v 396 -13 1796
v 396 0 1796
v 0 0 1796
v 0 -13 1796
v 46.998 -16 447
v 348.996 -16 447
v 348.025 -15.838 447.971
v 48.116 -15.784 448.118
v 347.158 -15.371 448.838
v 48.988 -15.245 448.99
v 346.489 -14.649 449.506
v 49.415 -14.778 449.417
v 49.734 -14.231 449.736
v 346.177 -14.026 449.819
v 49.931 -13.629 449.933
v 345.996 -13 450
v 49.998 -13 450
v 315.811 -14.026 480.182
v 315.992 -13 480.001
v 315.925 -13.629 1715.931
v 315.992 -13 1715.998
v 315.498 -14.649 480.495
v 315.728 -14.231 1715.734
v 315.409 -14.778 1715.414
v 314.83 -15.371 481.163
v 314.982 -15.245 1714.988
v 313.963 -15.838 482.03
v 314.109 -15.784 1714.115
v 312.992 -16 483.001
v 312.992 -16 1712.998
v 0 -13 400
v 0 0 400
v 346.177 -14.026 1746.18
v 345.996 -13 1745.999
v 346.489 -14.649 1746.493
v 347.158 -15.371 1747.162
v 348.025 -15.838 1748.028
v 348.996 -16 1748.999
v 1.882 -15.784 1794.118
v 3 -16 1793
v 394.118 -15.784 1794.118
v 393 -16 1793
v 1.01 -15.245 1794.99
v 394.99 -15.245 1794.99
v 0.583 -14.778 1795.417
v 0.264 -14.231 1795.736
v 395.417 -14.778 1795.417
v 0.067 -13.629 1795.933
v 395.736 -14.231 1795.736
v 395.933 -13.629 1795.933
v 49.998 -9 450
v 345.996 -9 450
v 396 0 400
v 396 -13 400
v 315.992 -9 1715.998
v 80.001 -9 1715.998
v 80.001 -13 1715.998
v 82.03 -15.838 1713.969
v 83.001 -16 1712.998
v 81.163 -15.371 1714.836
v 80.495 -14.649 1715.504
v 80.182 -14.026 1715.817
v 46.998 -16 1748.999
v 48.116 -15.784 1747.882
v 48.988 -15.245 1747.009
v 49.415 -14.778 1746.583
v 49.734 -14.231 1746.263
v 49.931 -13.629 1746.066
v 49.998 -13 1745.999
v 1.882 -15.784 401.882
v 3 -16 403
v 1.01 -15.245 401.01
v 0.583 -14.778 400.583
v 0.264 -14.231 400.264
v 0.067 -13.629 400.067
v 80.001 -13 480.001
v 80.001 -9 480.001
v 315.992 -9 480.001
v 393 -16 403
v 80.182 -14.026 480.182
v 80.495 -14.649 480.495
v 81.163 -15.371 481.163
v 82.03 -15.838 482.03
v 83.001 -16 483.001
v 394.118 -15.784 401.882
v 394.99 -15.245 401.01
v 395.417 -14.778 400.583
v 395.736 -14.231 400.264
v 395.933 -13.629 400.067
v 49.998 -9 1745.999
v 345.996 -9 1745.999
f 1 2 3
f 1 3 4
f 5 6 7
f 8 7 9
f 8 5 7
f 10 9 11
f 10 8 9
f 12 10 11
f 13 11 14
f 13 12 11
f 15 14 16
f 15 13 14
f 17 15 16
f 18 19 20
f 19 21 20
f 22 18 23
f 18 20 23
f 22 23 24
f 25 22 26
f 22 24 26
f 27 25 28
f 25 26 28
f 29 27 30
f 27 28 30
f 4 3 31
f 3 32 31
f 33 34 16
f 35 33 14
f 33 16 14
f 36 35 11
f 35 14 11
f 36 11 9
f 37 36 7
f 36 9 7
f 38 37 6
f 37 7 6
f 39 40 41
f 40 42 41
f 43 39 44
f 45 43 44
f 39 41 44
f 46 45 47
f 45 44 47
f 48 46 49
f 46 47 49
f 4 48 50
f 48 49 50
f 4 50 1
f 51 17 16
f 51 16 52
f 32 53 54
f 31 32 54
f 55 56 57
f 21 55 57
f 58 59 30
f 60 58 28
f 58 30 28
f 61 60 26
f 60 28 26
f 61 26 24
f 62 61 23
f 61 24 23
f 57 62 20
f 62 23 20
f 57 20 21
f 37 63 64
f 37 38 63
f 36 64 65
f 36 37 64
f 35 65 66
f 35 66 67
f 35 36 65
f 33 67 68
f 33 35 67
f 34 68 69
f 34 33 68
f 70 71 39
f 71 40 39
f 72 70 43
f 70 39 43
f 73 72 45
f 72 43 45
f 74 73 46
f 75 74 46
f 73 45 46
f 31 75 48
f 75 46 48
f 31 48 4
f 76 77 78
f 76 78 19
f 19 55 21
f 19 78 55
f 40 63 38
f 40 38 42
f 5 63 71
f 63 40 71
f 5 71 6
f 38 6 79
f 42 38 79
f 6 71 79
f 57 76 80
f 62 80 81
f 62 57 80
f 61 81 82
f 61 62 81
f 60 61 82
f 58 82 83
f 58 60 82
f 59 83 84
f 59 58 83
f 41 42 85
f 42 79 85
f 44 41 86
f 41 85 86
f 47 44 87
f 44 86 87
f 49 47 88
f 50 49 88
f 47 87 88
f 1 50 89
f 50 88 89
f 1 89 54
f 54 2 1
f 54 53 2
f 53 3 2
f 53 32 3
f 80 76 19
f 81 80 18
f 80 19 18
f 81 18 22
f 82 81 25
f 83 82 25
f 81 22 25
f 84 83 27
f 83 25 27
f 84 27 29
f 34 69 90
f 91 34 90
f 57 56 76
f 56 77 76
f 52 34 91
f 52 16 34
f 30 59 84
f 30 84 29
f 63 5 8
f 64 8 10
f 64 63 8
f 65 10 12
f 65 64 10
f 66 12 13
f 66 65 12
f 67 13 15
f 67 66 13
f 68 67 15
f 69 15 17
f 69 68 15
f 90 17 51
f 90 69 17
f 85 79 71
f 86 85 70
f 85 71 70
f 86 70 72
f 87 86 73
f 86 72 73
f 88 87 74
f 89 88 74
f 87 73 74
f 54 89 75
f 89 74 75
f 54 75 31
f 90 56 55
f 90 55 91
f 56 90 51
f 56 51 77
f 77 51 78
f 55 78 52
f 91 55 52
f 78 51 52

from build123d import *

# Parameters (mm, degrees)
F0_W      = 44.656470418
F0_H      = 33.8078811765
F1_DEPTH  = 16
F2_DEPTH  = 796
F3_DEPTH  = 196
F4_W      = 68.9578056335
F4_H      = 493.6993122101
F5_DEPTH  = 7
F6_DEPTH  = 9.7
F7_DEPTH  = 99.33
F8_DEPTH  = 99.33
F9_DEPTH  = 17.34
F10_DEPTH = 102.97
F11_W     = 35.2807044983
F11_H     = 492.0964837074
F12_DEPTH = 7
F13_DEPTH = 37.27
F14_DEPTH = 6.58
F15_DEPTH = 106.63
F16_DEPTH = 5.87
F17_DEPTH = 200
F18_DEPTH = 200
F19_DEPTH = 200
F20_DEPTH = 200
F21_DEPTH = 200
F22_DEPTH = 200
F23_DEPTH = 400
F24_DEPTH = 400
F25_DEPTH = 400
F26_DEPTH = 400
F27_DEPTH = 400
F28_DEPTH = 400
F29_DEPTH = 400
F30_DEPTH = 400
F31_DEPTH = 400
F32_DEPTH = 1000
F33_DEPTH = 1000
F34_DEPTH = 1000
F35_DEPTH = 1000
F36_DEPTH = 1000
F37_DEPTH = 1000
F38_R     = 3


with BuildPart() as f1:
    # F0 (on Front) → F1 (new body)
    with BuildSketch(Plane.XZ):
        with Locations((22.328235209, 16.9039405882)):
            Rectangle(F0_W, F0_H)
    extrude(amount=F1_DEPTH)

    # F2 (add): a face of the model
    f2_faces = [f1.faces().sort_by_distance(p)[0] for p in [
        (22.328235209, -8, 0),
    ]]
    extrude(f2_faces, amount=-F2_DEPTH)

    # F3 (add): a face of the model
    f3_faces = [f1.faces().sort_by_distance(p)[0] for p in [
        (0, -8, 398),
    ]]
    extrude(f3_faces, amount=-F3_DEPTH)

    # F4 (on face) → F5 (cut)
    with BuildSketch(Plane.XZ.offset(16)):
        with Locations((94.1769480705, 399.8196721077)):
            Rectangle(F4_W, F4_H)
    extrude(amount=-F5_DEPTH, mode=Mode.SUBTRACT)

    # F6 (cut): a face of the model
    f6_faces = [f1.faces().sort_by_distance(p)[0] for p in [
        (59.6980452538, -12.5, 399.8196721077),
    ]]
    extrude(f6_faces, amount=-F6_DEPTH, mode=Mode.SUBTRACT)

    # F7 (add): a face of the model
    f7_faces = [f1.faces().sort_by_distance(p)[0] for p in [
        (89.3269480705, -12.5, 646.6693282127),
    ]]
    extrude(f7_faces, amount=-F7_DEPTH)

    # F8 (cut): a face of the model
    f8_faces = [f1.faces().sort_by_distance(p)[0] for p in [
        (89.3269480705, -12.5, 646.6693282127),
    ]]
    extrude(f8_faces, amount=-F8_DEPTH, mode=Mode.SUBTRACT)

    # F9 (cut): a face of the model
    f9_faces = [f1.faces().sort_by_distance(p)[0] for p in [
        (128.6558508873, -12.5, 449.4846721077),
    ]]
    extrude(f9_faces, amount=-F9_DEPTH, mode=Mode.SUBTRACT)

    # F10 (cut): a face of the model
    f10_faces = [f1.faces().sort_by_distance(p)[0] for p in [
        (97.9969480705, -12.5, 152.9700160027),
    ]]
    extrude(f10_faces, amount=-F10_DEPTH, mode=Mode.SUBTRACT)

    # F11 (on face) → F12 (join)
    with BuildSketch(Plane.XZ.offset(9)):
        with Locations((91.7714834213, 432.6795041561)):
            Rectangle(F11_W, F11_H)
    extrude(amount=F12_DEPTH)

    # F13 (add): a face of the model
    f13_faces = [f1.faces().sort_by_distance(p)[0] for p in [
        (91.7714834213, -12.5, 678.7277460098),
    ]]
    extrude(f13_faces, amount=F13_DEPTH)

    # F14 (add): a face of the model
    f14_faces = [f1.faces().sort_by_distance(p)[0] for p in [
        (109.4118356705, -12.5, 451.3145041561),
    ]]
    extrude(f14_faces, amount=F14_DEPTH)

    # F15 (add): a face of the model
    f15_faces = [f1.faces().sort_by_distance(p)[0] for p in [
        (95.0614834213, -12.5, 186.6312623024),
    ]]
    extrude(f15_faces, amount=F15_DEPTH)

    # F16 (cut): a face of the model
    f16_faces = [f1.faces().sort_by_distance(p)[0] for p in [
        (74.1311311722, -12.5, 397.9995041561),
    ]]
    extrude(f16_faces, amount=-F16_DEPTH, mode=Mode.SUBTRACT)

    # F17 (add): a face of the model
    f17_faces = [f1.faces().sort_by_distance(p)[0] for p in [
        (196, -8, 398),
    ]]
    extrude(f17_faces, amount=F17_DEPTH)

    # F18 (cut): a face of the model
    f18_faces = [f1.faces().sort_by_distance(p)[0] for p in [
        (145.9958508873, -12.5, 397.9996721077),
    ]]
    extrude(f18_faces, amount=-F18_DEPTH, mode=Mode.SUBTRACT)

    # F19 (add): a face of the model
    f19_faces = [f1.faces().sort_by_distance(p)[0] for p in [
        (115.9918356705, -12.5, 397.9995041561),
    ]]
    extrude(f19_faces, amount=F19_DEPTH)

    # F20 (add): a face of the model
    f20_faces = [f1.faces().sort_by_distance(p)[0] for p in [
        (396, -8, 398),
    ]]
    extrude(f20_faces, amount=F20_DEPTH)

    # F21 (cut): a face of the model
    f21_faces = [f1.faces().sort_by_distance(p)[0] for p in [
        (345.9958508873, -12.5, 397.9996721077),
    ]]
    extrude(f21_faces, amount=-F21_DEPTH, mode=Mode.SUBTRACT)

    # F22 (add): a face of the model
    f22_faces = [f1.faces().sort_by_distance(p)[0] for p in [
        (315.9918356705, -12.5, 397.9995041561),
    ]]
    extrude(f22_faces, amount=F22_DEPTH)

    # F23 (add): a face of the model
    f23_faces = [f1.faces().sort_by_distance(p)[0] for p in [
        (596, -8, 398),
    ]]
    extrude(f23_faces, amount=F23_DEPTH)

    # F24 (cut): a face of the model
    f24_faces = [f1.faces().sort_by_distance(p)[0] for p in [
        (545.9958508873, -12.5, 397.9996721077),
    ]]
    extrude(f24_faces, amount=-F24_DEPTH, mode=Mode.SUBTRACT)

    # F25 (add): a face of the model
    f25_faces = [f1.faces().sort_by_distance(p)[0] for p in [
        (515.9918356705, -12.5, 397.9995041561),
    ]]
    extrude(f25_faces, amount=F25_DEPTH)

    # F26 (cut): a face of the model
    f26_faces = [f1.faces().sort_by_distance(p)[0] for p in [
        (497.9964834213, -12.5, 80.0012623024),
    ]]
    extrude(f26_faces, amount=-F26_DEPTH, mode=Mode.SUBTRACT)

    # F27 (add): a face of the model
    f27_faces = [f1.faces().sort_by_distance(p)[0] for p in [
        (497.9969480705, -12.5, 50.0000160027),
    ]]
    extrude(f27_faces, amount=F27_DEPTH)

    # F28 (cut): a face of the model
    f28_faces = [f1.faces().sort_by_distance(p)[0] for p in [
        (498, -8, 0),
    ]]
    extrude(f28_faces, amount=-F28_DEPTH, mode=Mode.SUBTRACT)

    # F29 (add): a face of the model
    f29_faces = [f1.faces().sort_by_distance(p)[0] for p in [
        (996, -8, 598),
    ]]
    extrude(f29_faces, amount=F29_DEPTH)

    # F30 (cut): a face of the model
    f30_faces = [f1.faces().sort_by_distance(p)[0] for p in [
        (945.9958508873, -12.5, 597.9996721077),
    ]]
    extrude(f30_faces, amount=-F30_DEPTH, mode=Mode.SUBTRACT)

    # F31 (add): a face of the model
    f31_faces = [f1.faces().sort_by_distance(p)[0] for p in [
        (915.9918356705, -12.5, 597.9995041561),
    ]]
    extrude(f31_faces, amount=F31_DEPTH)

    # F32 (cut): a face of the model
    f32_faces = [f1.faces().sort_by_distance(p)[0] for p in [
        (1315.9918356705, -12.5, 597.9995041561),
    ]]
    extrude(f32_faces, amount=-F32_DEPTH, mode=Mode.SUBTRACT)

    # F33 (add): a face of the model
    f33_faces = [f1.faces().sort_by_distance(p)[0] for p in [
        (1345.9958508873, -12.5, 597.9996721077),
    ]]
    extrude(f33_faces, amount=F33_DEPTH)

    # F34 (cut): a face of the model
    f34_faces = [f1.faces().sort_by_distance(p)[0] for p in [
        (1396, -8, 598),
    ]]
    extrude(f34_faces, amount=-F34_DEPTH, mode=Mode.SUBTRACT)

    # F35 (add): a face of the model
    f35_faces = [f1.faces().sort_by_distance(p)[0] for p in [
        (198, -8, 796),
    ]]
    extrude(f35_faces, amount=F35_DEPTH)

    # F36 (cut): a face of the model
    f36_faces = [f1.faces().sort_by_distance(p)[0] for p in [
        (197.9969480705, -12.5, 745.9993282127),
    ]]
    extrude(f36_faces, amount=-F36_DEPTH, mode=Mode.SUBTRACT)

    # F37 (add): a face of the model
    f37_faces = [f1.faces().sort_by_distance(p)[0] for p in [
        (197.9964834213, -12.5, 715.9977460098),
    ]]
    extrude(f37_faces, amount=F37_DEPTH)

    # F38
    f38_edges = [f1.edges().sort_by_distance(p)[0] for p in [
        (80.001131, -16, 1097.999504),
        (197.996483, -16, 1715.997746),
        (315.991836, -16, 1097.999504),
        (197.996483, -16, 480.001262),
        (0, -16, 1098),
        (198, -16, 400),
        (396, -16, 1098),
        (198, -16, 1796),
        (345.995851, -16, 1097.999672),
        (197.996948, -16, 450.000016),
        (49.998045, -16, 1097.999672),
        (197.996948, -16, 1745.999328),
    ]]
    fillet(f38_edges, radius=F38_R)


solid = f1.part
